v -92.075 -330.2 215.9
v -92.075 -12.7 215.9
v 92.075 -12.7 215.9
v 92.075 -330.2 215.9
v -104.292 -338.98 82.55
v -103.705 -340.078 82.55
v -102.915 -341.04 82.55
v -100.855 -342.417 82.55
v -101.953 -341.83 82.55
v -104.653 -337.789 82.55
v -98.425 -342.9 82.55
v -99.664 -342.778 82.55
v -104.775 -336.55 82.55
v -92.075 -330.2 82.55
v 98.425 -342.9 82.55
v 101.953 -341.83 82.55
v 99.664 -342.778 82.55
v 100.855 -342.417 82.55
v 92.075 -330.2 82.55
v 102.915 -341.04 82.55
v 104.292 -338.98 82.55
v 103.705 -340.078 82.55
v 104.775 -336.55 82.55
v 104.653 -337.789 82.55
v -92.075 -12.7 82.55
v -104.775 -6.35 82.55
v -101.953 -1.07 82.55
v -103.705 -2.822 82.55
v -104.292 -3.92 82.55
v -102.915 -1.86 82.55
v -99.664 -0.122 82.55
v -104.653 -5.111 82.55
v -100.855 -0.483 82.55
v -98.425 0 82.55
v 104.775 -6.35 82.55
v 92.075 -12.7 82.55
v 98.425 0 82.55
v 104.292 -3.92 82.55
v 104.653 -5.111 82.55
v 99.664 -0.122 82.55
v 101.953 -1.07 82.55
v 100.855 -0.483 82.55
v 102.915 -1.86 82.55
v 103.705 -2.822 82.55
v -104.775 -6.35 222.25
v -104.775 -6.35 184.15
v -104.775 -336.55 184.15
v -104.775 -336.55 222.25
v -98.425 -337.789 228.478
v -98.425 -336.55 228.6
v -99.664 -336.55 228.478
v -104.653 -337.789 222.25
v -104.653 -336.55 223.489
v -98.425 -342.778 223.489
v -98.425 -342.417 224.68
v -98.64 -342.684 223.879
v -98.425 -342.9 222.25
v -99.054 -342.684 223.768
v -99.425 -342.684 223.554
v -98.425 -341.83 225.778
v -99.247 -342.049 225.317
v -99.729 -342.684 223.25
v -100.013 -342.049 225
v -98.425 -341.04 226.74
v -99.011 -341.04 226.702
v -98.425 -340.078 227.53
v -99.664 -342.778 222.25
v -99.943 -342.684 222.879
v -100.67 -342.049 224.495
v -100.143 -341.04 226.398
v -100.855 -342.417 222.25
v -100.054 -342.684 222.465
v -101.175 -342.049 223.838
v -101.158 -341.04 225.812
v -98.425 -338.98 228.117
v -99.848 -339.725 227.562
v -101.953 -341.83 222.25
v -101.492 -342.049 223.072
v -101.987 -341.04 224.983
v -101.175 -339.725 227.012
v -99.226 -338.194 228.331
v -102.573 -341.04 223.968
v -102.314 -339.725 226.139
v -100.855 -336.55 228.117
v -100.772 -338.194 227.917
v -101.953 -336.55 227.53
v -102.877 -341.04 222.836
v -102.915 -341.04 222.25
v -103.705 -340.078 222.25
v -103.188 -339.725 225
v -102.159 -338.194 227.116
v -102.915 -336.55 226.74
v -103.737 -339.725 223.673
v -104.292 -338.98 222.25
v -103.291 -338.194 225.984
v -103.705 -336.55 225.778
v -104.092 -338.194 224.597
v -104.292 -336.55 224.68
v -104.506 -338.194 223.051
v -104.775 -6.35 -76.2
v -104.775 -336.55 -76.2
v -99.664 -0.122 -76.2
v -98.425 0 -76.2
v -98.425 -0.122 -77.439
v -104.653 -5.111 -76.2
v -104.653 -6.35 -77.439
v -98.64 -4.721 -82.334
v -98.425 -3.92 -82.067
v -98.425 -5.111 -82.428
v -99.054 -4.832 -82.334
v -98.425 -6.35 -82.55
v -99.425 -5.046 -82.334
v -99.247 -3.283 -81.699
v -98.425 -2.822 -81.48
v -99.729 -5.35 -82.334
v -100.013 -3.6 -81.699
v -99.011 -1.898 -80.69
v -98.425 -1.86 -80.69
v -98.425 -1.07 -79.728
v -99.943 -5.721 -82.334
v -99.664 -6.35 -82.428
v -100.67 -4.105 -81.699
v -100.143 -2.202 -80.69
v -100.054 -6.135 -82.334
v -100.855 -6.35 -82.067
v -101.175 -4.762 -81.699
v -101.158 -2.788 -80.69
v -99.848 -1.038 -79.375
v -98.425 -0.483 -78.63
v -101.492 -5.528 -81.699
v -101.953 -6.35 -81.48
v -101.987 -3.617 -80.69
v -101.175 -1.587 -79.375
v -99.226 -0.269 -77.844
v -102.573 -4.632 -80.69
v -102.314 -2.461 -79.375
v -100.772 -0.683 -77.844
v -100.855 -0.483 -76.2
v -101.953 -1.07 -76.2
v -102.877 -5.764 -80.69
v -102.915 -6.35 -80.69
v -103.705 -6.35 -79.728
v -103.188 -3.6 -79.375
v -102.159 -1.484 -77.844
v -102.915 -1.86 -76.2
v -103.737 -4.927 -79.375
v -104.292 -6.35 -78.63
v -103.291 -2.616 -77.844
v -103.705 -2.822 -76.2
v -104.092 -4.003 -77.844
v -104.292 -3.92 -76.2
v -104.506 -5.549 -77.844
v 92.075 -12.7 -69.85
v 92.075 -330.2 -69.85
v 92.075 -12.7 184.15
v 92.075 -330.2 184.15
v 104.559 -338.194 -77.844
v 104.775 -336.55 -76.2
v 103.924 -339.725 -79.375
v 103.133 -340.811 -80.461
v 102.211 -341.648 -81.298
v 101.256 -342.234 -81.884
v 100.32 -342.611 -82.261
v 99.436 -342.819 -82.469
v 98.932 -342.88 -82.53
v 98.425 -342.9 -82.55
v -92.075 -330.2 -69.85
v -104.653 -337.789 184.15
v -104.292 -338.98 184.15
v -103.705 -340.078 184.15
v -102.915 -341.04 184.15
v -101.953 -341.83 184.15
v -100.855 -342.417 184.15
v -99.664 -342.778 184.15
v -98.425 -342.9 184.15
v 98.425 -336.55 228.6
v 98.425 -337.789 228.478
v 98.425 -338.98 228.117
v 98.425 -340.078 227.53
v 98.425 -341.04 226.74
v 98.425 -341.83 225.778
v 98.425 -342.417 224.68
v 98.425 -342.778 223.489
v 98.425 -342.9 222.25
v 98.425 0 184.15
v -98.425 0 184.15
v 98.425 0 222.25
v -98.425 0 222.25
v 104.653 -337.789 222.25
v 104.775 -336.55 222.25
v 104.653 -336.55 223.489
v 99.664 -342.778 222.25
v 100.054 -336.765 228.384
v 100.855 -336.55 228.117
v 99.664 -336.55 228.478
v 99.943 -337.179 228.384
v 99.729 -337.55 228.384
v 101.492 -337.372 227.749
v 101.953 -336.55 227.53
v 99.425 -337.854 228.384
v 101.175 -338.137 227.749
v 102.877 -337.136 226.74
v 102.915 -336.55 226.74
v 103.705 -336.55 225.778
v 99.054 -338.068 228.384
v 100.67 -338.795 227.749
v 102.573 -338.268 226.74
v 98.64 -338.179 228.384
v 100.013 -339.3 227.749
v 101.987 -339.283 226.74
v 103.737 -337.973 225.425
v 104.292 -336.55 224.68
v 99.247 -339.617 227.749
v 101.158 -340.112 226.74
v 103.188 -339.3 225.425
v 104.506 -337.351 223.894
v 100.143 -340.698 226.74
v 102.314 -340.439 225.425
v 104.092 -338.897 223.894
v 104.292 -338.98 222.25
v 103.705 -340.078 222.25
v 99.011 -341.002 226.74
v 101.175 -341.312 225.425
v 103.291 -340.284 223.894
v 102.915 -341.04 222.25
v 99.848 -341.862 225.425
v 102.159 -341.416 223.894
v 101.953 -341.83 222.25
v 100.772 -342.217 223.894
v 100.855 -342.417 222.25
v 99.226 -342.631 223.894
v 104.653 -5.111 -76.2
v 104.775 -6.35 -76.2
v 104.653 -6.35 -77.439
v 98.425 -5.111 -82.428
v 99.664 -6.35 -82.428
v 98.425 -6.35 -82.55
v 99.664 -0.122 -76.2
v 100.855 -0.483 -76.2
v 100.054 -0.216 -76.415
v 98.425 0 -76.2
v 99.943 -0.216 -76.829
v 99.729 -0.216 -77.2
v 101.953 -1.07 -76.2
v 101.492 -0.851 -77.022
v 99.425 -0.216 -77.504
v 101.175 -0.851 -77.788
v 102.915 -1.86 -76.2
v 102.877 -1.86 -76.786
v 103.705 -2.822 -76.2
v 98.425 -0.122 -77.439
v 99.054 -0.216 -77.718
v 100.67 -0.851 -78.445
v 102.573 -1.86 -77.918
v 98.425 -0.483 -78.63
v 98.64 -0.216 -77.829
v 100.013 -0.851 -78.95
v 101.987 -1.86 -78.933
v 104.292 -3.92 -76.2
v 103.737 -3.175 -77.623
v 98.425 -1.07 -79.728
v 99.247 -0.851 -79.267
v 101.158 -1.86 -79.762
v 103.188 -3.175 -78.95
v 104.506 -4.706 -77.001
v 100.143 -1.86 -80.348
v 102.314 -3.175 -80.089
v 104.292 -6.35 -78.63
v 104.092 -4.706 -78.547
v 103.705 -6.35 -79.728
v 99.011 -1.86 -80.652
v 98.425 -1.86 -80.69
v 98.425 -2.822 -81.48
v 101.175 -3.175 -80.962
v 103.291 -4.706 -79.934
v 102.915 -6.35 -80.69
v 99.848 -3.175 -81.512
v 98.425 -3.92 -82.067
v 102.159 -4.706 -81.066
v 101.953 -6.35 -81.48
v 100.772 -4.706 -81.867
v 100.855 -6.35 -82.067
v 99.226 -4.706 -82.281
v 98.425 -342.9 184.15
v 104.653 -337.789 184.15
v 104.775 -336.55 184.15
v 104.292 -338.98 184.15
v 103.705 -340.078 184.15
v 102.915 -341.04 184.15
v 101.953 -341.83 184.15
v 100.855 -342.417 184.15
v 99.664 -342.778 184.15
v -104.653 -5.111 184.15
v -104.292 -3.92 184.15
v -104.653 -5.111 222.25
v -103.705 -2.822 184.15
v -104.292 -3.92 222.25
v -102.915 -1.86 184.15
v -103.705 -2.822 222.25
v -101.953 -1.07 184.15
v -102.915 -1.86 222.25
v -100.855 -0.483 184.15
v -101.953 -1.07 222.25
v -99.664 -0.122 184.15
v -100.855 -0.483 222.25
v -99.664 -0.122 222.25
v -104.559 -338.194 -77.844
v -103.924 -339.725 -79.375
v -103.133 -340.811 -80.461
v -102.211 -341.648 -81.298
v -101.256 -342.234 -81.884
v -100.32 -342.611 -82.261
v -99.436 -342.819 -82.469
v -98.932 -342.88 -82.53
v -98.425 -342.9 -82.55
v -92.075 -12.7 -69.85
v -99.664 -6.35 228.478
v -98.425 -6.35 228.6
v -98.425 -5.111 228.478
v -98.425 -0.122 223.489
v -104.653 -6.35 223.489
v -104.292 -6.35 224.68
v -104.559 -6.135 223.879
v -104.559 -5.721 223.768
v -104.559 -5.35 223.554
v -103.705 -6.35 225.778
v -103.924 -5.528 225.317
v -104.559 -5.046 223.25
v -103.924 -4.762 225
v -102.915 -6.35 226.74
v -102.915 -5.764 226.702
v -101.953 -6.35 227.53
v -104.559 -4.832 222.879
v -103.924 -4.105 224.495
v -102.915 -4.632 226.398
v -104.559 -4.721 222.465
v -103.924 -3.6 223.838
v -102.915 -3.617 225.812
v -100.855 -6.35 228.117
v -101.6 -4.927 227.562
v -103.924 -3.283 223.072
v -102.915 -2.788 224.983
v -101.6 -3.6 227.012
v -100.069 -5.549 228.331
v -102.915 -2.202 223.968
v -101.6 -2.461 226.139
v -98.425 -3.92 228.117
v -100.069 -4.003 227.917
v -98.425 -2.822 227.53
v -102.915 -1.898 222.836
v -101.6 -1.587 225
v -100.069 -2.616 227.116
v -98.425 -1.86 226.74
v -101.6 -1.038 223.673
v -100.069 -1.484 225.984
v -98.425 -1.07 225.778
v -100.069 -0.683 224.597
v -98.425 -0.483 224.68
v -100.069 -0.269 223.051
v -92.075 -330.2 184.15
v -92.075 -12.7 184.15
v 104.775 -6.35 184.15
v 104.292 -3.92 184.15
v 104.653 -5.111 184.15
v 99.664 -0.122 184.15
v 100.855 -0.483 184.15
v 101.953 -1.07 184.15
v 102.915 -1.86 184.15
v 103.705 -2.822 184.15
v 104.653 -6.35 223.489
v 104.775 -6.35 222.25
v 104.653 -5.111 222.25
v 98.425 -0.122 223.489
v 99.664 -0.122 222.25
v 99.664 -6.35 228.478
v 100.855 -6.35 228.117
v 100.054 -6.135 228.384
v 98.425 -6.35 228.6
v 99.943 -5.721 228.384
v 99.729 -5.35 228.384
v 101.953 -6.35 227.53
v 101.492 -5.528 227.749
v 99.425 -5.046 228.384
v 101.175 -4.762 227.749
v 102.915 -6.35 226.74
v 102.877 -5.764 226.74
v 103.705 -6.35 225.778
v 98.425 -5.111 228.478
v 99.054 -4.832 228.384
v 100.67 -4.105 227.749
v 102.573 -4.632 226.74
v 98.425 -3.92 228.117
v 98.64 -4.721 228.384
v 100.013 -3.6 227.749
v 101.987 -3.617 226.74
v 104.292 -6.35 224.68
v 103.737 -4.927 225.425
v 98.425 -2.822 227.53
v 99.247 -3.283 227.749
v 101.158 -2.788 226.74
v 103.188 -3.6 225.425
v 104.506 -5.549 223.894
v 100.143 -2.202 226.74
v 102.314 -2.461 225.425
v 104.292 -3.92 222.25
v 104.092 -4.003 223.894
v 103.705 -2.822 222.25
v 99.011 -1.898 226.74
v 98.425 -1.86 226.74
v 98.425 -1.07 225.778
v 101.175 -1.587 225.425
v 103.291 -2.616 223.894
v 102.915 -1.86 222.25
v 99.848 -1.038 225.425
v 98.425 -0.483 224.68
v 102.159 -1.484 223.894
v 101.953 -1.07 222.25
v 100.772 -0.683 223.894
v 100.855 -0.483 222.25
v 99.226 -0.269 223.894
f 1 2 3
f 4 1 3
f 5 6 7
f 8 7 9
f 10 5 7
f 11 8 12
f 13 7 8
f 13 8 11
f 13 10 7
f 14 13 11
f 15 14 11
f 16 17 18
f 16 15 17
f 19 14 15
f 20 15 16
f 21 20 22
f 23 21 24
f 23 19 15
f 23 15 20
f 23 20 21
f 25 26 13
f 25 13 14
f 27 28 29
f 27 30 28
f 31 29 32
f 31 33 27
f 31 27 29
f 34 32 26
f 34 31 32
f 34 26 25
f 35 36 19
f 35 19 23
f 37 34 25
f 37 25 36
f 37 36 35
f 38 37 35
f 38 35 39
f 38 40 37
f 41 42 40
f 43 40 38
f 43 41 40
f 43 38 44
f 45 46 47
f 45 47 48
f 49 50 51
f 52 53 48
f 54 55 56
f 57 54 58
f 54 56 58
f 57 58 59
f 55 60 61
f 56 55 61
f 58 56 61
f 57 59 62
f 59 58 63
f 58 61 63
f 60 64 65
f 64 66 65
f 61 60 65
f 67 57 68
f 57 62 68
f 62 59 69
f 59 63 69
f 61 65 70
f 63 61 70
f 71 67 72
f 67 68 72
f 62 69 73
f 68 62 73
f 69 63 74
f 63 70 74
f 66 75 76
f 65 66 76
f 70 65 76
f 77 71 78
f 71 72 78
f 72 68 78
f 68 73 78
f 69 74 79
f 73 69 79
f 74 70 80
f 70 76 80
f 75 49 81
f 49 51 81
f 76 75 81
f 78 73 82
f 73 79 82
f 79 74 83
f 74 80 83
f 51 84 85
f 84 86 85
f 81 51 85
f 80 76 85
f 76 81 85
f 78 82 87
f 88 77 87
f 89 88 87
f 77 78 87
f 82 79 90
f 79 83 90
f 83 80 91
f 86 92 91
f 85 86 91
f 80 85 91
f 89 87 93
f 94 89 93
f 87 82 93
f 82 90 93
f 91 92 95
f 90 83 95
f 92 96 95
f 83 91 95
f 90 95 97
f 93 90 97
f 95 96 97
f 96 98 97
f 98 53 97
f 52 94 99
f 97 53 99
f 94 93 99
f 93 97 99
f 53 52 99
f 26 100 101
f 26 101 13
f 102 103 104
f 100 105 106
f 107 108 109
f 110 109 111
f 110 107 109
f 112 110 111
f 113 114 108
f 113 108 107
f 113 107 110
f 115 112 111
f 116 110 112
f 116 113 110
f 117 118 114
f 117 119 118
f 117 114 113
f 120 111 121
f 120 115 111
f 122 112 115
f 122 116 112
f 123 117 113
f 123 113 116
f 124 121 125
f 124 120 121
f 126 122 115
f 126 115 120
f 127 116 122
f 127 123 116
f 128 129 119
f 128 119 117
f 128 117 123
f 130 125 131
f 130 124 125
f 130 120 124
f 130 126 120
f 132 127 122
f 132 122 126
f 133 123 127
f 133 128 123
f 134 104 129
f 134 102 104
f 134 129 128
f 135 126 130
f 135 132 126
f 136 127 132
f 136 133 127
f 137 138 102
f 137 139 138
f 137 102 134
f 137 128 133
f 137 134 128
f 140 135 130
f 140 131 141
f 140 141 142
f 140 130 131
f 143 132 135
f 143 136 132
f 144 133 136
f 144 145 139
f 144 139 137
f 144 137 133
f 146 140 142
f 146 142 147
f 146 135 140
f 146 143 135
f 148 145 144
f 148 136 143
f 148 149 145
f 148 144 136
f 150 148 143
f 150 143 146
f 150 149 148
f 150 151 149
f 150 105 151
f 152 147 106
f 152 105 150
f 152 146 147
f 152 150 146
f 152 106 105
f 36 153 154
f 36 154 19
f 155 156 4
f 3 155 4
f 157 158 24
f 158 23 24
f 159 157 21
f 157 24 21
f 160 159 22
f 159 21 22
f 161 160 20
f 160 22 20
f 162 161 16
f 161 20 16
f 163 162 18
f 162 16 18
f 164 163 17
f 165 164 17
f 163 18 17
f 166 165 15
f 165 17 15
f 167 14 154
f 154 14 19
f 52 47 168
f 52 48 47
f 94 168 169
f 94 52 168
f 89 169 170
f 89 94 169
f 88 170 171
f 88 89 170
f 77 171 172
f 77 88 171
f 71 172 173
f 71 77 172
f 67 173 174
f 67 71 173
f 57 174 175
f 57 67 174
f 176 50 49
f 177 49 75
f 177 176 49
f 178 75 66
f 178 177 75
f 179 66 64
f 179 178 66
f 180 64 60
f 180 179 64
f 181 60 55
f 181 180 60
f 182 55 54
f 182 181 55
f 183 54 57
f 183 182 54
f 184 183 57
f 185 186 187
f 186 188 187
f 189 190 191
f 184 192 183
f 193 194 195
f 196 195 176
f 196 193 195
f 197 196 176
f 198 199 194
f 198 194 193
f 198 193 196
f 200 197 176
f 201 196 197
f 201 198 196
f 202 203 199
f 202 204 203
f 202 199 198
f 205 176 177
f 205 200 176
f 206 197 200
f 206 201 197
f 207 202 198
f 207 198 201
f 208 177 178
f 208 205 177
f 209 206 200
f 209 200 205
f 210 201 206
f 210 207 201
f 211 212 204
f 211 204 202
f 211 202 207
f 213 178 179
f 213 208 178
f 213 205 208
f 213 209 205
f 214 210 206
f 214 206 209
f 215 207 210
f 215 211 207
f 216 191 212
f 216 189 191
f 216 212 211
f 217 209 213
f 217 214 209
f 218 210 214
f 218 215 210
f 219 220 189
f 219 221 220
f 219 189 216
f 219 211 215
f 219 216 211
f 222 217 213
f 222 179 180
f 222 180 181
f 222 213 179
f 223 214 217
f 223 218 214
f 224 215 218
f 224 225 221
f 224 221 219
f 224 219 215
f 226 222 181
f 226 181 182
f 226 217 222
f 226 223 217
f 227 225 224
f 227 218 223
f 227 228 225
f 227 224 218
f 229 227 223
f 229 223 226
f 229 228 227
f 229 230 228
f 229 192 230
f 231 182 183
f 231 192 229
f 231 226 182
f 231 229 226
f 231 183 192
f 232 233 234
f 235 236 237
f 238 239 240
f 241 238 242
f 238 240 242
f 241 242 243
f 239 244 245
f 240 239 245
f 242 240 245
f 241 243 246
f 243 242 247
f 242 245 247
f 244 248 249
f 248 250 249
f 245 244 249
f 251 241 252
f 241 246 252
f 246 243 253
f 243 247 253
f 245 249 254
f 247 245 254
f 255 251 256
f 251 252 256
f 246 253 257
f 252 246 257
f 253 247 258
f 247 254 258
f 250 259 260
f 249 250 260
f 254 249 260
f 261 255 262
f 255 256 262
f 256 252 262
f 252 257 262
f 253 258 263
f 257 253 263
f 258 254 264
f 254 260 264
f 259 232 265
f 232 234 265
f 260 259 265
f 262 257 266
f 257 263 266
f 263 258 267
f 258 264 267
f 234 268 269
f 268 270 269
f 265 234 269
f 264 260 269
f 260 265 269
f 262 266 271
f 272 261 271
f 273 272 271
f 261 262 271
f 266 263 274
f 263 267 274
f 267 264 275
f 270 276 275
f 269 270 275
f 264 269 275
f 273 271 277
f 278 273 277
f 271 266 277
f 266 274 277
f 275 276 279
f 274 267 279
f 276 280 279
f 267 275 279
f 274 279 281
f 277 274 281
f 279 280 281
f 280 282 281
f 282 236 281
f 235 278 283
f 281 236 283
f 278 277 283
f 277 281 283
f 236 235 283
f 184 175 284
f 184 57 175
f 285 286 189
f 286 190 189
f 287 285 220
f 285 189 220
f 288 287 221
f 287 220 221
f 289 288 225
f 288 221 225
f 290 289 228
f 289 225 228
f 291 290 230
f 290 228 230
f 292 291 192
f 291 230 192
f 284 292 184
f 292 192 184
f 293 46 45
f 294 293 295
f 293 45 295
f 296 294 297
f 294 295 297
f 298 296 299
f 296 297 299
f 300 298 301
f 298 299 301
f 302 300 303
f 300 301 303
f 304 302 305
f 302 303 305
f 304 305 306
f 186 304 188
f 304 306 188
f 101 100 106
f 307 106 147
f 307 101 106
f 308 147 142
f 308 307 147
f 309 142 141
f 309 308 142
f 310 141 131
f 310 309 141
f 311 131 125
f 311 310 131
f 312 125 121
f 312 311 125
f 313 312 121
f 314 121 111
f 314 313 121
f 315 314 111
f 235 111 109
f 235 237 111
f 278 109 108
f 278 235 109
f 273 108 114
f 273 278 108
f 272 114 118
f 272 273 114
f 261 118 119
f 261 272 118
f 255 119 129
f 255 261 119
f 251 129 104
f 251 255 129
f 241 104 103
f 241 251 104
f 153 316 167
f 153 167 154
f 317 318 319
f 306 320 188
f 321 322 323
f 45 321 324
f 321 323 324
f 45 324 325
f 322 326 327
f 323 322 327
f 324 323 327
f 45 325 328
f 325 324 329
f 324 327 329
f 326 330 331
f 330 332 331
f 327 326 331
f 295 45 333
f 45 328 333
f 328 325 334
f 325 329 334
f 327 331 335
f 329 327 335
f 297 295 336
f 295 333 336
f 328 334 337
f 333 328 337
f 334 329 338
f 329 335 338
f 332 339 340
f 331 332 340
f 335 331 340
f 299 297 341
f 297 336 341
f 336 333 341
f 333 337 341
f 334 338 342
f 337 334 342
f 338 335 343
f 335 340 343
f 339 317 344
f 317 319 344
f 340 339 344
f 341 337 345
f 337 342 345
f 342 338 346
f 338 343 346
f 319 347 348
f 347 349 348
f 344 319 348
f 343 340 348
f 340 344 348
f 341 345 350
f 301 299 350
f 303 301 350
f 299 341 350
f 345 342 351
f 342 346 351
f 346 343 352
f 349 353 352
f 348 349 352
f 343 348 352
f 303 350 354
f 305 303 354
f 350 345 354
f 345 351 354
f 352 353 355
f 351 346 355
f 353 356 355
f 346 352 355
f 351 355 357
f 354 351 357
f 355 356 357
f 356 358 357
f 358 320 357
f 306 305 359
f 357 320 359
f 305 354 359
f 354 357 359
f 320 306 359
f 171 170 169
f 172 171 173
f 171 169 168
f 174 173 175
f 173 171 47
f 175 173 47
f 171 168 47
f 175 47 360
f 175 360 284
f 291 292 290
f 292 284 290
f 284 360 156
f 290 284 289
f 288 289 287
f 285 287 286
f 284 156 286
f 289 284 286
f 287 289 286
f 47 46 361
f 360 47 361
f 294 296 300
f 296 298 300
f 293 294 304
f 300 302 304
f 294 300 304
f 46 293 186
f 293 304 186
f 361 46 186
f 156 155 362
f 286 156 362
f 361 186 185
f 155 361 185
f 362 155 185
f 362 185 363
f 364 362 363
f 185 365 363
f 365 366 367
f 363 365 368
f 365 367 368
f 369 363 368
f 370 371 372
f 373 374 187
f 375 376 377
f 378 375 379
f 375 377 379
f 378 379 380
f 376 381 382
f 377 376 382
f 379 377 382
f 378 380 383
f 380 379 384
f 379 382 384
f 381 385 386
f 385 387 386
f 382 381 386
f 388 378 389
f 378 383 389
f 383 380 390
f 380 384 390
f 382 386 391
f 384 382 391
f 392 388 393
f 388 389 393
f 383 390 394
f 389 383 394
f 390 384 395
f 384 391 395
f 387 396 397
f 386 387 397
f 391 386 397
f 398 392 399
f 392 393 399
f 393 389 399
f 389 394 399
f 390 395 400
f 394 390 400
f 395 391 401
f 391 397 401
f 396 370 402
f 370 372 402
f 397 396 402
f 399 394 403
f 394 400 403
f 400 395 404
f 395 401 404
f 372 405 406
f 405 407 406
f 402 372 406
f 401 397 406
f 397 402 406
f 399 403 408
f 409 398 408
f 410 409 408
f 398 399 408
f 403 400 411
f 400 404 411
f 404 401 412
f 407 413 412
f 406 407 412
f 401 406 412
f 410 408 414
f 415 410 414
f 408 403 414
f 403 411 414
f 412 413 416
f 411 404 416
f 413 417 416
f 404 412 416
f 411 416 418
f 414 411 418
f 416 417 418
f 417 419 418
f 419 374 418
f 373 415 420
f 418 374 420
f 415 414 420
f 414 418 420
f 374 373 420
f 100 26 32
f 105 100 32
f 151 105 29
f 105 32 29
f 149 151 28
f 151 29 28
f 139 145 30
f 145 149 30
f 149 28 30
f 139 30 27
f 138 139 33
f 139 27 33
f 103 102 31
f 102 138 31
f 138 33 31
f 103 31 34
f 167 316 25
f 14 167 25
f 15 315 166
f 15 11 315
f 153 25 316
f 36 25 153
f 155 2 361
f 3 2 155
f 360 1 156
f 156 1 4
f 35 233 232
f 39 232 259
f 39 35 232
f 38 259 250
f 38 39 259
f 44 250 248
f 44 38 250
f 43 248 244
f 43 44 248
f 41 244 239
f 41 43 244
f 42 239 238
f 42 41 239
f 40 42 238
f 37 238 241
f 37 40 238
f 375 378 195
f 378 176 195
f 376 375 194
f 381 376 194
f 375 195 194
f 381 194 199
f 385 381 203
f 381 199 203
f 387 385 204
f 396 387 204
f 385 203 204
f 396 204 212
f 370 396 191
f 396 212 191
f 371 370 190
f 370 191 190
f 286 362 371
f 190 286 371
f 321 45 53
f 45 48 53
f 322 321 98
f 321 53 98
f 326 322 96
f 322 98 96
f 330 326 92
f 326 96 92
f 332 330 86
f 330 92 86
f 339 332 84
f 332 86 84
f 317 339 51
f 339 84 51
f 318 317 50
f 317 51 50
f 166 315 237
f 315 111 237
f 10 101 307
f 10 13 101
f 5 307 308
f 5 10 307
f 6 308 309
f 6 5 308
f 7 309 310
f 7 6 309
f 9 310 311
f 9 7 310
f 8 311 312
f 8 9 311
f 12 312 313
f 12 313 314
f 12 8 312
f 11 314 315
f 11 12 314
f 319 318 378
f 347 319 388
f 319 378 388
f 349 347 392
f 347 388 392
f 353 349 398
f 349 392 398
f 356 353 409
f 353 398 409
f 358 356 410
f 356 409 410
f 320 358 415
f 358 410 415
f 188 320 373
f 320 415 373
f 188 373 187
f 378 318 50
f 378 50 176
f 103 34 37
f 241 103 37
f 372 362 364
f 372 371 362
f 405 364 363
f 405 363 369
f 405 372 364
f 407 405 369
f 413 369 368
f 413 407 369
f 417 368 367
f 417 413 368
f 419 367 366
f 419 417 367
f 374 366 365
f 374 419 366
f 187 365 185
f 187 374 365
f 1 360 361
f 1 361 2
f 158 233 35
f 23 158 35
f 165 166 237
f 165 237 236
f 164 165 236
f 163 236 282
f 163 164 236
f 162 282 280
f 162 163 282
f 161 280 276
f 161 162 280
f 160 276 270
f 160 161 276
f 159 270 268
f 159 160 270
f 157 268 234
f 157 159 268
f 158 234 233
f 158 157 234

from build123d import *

# Parameters (mm, degrees)
F0_W     = 209.55
F0_H     = 44.45
F1_DEPTH = 342.9
F0_H_2   = 165.1
F2_T     = -12.7
F2_2_T   = -12.7
F3_R     = 6.35
F3_2_R   = 6.35


with BuildPart() as f1:
    # F0 (on Front) → F1 (new body)
    with BuildSketch(Plane.XZ):
        with Locations((0, 206.375)):
            Rectangle(F0_W, F0_H)
    extrude(amount=F1_DEPTH)

    # F2#2
    f2_2_openings = [f1.faces().sort_by_distance(p)[0] for p in [
        (0, -171.45, 184.15),
    ]]
    offset(amount=F2_2_T, openings=f2_2_openings)

    # F3
    f3_edges = [f1.edges().sort_by_distance(p)[0] for p in [
        (104.775, -342.9, 206.375),
        (104.775, 0, 206.375),
        (104.775, -171.45, 228.6),
        (0, 0, 228.6),
        (-104.775, -171.45, 228.6),
        (0, -342.9, 228.6),
        (-104.775, -342.9, 206.375),
        (-104.775, 0, 206.375),
    ]]
    fillet(f3_edges, radius=F3_R)


with BuildPart() as f1b:
    # F0 (on Front) → F1, piece 2 (new body)
    with BuildSketch(Plane.XZ):
        Rectangle(F0_W, F0_H_2)
    extrude(amount=F1_DEPTH)

    # F2
    f2_openings = [f1b.faces().sort_by_distance(p)[0] for p in [
        (0, -171.45, 82.55),
    ]]
    offset(amount=F2_T, openings=f2_openings)

    # F3#2
    f3_2_edges = [f1b.edges().sort_by_distance(p)[0] for p in [
        (104.775, -342.9, 0),
        (-104.775, -342.9, 0),
        (104.775, -171.45, -82.55),
        (104.775, 0, 0),
        (-104.775, 0, 0),
        (0, 0, -82.55),
        (-104.775, -171.45, -82.55),
    ]]
    fillet(f3_2_edges, radius=F3_2_R)


solid = Compound([f1.part, f1b.part])
